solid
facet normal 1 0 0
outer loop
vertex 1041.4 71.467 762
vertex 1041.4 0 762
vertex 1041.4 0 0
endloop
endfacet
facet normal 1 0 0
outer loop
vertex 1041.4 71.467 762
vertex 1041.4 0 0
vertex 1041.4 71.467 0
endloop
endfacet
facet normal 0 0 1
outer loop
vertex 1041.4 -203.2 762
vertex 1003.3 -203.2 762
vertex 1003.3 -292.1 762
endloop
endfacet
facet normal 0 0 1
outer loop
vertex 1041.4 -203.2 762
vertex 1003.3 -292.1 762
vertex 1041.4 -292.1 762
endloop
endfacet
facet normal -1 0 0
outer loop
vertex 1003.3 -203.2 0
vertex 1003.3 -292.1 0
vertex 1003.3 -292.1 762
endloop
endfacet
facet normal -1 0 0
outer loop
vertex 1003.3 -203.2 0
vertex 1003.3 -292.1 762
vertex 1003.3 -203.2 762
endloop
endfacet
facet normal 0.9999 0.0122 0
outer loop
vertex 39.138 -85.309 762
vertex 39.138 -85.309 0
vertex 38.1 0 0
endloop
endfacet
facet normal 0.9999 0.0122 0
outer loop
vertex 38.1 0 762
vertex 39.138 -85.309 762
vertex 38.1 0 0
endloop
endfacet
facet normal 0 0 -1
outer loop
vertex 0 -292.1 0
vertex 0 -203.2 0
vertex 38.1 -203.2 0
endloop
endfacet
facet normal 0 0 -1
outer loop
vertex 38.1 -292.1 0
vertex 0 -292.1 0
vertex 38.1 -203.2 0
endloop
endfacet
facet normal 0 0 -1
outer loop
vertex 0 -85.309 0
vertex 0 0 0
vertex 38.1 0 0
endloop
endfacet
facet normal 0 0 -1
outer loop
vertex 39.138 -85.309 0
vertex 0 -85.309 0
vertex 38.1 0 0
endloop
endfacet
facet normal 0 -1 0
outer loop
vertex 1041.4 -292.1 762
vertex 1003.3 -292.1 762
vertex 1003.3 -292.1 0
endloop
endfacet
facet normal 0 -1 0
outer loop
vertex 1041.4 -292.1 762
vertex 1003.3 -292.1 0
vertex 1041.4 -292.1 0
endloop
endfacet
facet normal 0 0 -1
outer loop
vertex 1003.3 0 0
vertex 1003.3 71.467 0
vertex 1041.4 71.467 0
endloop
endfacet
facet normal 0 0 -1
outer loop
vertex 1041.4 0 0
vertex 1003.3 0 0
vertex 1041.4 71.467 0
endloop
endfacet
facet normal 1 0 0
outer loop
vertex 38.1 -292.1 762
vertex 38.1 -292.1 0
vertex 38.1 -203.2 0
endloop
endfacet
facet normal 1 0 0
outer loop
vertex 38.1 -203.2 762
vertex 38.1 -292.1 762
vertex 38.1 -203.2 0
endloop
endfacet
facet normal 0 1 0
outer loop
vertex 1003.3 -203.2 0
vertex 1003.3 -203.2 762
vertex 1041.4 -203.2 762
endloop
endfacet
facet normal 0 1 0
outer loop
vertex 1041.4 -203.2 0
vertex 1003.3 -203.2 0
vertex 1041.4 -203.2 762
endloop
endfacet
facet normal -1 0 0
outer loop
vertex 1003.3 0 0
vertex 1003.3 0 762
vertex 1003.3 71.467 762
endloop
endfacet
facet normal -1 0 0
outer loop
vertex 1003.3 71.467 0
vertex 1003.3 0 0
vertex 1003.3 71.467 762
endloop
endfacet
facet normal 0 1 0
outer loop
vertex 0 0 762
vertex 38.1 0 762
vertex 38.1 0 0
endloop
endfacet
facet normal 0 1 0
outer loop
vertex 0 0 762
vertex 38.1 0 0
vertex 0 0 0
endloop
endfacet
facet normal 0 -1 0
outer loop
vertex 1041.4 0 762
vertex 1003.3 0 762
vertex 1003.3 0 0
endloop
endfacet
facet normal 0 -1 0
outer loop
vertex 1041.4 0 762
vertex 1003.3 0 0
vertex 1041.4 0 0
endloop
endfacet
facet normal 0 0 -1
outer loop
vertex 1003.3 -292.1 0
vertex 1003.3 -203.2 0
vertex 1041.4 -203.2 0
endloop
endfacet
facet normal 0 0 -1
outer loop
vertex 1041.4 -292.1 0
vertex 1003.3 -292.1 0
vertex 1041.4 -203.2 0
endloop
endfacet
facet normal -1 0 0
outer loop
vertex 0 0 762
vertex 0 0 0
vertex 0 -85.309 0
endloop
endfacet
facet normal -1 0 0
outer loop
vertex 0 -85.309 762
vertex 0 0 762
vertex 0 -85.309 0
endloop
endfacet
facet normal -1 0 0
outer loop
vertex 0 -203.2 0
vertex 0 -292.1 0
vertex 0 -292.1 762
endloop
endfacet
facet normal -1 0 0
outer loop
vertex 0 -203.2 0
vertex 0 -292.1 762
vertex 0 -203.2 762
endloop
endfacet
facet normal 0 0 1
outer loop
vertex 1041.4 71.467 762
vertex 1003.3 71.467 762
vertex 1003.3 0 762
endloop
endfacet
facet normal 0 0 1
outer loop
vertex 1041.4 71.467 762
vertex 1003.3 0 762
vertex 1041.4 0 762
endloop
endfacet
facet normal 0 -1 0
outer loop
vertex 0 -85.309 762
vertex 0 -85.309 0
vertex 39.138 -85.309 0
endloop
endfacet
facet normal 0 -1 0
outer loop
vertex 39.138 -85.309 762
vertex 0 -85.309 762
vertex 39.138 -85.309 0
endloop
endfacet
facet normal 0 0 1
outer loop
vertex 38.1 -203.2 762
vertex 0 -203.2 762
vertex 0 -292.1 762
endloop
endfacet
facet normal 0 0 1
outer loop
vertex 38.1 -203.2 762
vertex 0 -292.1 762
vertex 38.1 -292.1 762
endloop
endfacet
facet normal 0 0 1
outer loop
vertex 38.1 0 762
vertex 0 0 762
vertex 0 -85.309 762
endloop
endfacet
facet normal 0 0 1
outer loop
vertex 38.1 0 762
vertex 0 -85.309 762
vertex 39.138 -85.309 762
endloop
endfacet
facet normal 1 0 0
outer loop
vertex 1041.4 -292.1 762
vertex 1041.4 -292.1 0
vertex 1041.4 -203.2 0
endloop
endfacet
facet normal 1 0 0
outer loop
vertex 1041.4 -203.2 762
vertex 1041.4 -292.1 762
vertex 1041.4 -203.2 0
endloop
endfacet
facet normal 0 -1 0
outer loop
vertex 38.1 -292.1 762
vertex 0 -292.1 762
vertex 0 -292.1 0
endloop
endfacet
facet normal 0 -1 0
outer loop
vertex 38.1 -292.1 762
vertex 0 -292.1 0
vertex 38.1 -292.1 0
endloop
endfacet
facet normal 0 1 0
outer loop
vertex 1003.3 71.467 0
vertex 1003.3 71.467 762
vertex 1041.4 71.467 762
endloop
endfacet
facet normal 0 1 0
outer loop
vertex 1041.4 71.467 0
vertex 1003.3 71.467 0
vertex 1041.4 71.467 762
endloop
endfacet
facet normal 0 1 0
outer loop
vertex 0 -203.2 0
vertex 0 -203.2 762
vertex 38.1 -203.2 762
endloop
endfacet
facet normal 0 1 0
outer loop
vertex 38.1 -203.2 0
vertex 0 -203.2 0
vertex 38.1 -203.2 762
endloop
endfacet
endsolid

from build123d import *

# Parameters (mm, degrees)
F0_W     = 38.1
F0_H     = 88.9
F0_H_2   = 71.467401
F1_DEPTH = 762


with BuildPart() as f1:
    # F0 (on Top) → F1 (new body)
    with BuildSketch(Plane.XY):
        Polygon((38.1, 0), (0, 0), (0, -85.309267), (39.138272, -85.309267), align=None)
        with Locations((19.05, -247.65)):
            Rectangle(F0_W, F0_H)
        with Locations((1022.35, 35.7337)):
            Rectangle(F0_W, F0_H_2)
        with Locations((1022.35, -247.65)):
            Rectangle(F0_W, F0_H)
    extrude(amount=F1_DEPTH)


solid = f1.part
